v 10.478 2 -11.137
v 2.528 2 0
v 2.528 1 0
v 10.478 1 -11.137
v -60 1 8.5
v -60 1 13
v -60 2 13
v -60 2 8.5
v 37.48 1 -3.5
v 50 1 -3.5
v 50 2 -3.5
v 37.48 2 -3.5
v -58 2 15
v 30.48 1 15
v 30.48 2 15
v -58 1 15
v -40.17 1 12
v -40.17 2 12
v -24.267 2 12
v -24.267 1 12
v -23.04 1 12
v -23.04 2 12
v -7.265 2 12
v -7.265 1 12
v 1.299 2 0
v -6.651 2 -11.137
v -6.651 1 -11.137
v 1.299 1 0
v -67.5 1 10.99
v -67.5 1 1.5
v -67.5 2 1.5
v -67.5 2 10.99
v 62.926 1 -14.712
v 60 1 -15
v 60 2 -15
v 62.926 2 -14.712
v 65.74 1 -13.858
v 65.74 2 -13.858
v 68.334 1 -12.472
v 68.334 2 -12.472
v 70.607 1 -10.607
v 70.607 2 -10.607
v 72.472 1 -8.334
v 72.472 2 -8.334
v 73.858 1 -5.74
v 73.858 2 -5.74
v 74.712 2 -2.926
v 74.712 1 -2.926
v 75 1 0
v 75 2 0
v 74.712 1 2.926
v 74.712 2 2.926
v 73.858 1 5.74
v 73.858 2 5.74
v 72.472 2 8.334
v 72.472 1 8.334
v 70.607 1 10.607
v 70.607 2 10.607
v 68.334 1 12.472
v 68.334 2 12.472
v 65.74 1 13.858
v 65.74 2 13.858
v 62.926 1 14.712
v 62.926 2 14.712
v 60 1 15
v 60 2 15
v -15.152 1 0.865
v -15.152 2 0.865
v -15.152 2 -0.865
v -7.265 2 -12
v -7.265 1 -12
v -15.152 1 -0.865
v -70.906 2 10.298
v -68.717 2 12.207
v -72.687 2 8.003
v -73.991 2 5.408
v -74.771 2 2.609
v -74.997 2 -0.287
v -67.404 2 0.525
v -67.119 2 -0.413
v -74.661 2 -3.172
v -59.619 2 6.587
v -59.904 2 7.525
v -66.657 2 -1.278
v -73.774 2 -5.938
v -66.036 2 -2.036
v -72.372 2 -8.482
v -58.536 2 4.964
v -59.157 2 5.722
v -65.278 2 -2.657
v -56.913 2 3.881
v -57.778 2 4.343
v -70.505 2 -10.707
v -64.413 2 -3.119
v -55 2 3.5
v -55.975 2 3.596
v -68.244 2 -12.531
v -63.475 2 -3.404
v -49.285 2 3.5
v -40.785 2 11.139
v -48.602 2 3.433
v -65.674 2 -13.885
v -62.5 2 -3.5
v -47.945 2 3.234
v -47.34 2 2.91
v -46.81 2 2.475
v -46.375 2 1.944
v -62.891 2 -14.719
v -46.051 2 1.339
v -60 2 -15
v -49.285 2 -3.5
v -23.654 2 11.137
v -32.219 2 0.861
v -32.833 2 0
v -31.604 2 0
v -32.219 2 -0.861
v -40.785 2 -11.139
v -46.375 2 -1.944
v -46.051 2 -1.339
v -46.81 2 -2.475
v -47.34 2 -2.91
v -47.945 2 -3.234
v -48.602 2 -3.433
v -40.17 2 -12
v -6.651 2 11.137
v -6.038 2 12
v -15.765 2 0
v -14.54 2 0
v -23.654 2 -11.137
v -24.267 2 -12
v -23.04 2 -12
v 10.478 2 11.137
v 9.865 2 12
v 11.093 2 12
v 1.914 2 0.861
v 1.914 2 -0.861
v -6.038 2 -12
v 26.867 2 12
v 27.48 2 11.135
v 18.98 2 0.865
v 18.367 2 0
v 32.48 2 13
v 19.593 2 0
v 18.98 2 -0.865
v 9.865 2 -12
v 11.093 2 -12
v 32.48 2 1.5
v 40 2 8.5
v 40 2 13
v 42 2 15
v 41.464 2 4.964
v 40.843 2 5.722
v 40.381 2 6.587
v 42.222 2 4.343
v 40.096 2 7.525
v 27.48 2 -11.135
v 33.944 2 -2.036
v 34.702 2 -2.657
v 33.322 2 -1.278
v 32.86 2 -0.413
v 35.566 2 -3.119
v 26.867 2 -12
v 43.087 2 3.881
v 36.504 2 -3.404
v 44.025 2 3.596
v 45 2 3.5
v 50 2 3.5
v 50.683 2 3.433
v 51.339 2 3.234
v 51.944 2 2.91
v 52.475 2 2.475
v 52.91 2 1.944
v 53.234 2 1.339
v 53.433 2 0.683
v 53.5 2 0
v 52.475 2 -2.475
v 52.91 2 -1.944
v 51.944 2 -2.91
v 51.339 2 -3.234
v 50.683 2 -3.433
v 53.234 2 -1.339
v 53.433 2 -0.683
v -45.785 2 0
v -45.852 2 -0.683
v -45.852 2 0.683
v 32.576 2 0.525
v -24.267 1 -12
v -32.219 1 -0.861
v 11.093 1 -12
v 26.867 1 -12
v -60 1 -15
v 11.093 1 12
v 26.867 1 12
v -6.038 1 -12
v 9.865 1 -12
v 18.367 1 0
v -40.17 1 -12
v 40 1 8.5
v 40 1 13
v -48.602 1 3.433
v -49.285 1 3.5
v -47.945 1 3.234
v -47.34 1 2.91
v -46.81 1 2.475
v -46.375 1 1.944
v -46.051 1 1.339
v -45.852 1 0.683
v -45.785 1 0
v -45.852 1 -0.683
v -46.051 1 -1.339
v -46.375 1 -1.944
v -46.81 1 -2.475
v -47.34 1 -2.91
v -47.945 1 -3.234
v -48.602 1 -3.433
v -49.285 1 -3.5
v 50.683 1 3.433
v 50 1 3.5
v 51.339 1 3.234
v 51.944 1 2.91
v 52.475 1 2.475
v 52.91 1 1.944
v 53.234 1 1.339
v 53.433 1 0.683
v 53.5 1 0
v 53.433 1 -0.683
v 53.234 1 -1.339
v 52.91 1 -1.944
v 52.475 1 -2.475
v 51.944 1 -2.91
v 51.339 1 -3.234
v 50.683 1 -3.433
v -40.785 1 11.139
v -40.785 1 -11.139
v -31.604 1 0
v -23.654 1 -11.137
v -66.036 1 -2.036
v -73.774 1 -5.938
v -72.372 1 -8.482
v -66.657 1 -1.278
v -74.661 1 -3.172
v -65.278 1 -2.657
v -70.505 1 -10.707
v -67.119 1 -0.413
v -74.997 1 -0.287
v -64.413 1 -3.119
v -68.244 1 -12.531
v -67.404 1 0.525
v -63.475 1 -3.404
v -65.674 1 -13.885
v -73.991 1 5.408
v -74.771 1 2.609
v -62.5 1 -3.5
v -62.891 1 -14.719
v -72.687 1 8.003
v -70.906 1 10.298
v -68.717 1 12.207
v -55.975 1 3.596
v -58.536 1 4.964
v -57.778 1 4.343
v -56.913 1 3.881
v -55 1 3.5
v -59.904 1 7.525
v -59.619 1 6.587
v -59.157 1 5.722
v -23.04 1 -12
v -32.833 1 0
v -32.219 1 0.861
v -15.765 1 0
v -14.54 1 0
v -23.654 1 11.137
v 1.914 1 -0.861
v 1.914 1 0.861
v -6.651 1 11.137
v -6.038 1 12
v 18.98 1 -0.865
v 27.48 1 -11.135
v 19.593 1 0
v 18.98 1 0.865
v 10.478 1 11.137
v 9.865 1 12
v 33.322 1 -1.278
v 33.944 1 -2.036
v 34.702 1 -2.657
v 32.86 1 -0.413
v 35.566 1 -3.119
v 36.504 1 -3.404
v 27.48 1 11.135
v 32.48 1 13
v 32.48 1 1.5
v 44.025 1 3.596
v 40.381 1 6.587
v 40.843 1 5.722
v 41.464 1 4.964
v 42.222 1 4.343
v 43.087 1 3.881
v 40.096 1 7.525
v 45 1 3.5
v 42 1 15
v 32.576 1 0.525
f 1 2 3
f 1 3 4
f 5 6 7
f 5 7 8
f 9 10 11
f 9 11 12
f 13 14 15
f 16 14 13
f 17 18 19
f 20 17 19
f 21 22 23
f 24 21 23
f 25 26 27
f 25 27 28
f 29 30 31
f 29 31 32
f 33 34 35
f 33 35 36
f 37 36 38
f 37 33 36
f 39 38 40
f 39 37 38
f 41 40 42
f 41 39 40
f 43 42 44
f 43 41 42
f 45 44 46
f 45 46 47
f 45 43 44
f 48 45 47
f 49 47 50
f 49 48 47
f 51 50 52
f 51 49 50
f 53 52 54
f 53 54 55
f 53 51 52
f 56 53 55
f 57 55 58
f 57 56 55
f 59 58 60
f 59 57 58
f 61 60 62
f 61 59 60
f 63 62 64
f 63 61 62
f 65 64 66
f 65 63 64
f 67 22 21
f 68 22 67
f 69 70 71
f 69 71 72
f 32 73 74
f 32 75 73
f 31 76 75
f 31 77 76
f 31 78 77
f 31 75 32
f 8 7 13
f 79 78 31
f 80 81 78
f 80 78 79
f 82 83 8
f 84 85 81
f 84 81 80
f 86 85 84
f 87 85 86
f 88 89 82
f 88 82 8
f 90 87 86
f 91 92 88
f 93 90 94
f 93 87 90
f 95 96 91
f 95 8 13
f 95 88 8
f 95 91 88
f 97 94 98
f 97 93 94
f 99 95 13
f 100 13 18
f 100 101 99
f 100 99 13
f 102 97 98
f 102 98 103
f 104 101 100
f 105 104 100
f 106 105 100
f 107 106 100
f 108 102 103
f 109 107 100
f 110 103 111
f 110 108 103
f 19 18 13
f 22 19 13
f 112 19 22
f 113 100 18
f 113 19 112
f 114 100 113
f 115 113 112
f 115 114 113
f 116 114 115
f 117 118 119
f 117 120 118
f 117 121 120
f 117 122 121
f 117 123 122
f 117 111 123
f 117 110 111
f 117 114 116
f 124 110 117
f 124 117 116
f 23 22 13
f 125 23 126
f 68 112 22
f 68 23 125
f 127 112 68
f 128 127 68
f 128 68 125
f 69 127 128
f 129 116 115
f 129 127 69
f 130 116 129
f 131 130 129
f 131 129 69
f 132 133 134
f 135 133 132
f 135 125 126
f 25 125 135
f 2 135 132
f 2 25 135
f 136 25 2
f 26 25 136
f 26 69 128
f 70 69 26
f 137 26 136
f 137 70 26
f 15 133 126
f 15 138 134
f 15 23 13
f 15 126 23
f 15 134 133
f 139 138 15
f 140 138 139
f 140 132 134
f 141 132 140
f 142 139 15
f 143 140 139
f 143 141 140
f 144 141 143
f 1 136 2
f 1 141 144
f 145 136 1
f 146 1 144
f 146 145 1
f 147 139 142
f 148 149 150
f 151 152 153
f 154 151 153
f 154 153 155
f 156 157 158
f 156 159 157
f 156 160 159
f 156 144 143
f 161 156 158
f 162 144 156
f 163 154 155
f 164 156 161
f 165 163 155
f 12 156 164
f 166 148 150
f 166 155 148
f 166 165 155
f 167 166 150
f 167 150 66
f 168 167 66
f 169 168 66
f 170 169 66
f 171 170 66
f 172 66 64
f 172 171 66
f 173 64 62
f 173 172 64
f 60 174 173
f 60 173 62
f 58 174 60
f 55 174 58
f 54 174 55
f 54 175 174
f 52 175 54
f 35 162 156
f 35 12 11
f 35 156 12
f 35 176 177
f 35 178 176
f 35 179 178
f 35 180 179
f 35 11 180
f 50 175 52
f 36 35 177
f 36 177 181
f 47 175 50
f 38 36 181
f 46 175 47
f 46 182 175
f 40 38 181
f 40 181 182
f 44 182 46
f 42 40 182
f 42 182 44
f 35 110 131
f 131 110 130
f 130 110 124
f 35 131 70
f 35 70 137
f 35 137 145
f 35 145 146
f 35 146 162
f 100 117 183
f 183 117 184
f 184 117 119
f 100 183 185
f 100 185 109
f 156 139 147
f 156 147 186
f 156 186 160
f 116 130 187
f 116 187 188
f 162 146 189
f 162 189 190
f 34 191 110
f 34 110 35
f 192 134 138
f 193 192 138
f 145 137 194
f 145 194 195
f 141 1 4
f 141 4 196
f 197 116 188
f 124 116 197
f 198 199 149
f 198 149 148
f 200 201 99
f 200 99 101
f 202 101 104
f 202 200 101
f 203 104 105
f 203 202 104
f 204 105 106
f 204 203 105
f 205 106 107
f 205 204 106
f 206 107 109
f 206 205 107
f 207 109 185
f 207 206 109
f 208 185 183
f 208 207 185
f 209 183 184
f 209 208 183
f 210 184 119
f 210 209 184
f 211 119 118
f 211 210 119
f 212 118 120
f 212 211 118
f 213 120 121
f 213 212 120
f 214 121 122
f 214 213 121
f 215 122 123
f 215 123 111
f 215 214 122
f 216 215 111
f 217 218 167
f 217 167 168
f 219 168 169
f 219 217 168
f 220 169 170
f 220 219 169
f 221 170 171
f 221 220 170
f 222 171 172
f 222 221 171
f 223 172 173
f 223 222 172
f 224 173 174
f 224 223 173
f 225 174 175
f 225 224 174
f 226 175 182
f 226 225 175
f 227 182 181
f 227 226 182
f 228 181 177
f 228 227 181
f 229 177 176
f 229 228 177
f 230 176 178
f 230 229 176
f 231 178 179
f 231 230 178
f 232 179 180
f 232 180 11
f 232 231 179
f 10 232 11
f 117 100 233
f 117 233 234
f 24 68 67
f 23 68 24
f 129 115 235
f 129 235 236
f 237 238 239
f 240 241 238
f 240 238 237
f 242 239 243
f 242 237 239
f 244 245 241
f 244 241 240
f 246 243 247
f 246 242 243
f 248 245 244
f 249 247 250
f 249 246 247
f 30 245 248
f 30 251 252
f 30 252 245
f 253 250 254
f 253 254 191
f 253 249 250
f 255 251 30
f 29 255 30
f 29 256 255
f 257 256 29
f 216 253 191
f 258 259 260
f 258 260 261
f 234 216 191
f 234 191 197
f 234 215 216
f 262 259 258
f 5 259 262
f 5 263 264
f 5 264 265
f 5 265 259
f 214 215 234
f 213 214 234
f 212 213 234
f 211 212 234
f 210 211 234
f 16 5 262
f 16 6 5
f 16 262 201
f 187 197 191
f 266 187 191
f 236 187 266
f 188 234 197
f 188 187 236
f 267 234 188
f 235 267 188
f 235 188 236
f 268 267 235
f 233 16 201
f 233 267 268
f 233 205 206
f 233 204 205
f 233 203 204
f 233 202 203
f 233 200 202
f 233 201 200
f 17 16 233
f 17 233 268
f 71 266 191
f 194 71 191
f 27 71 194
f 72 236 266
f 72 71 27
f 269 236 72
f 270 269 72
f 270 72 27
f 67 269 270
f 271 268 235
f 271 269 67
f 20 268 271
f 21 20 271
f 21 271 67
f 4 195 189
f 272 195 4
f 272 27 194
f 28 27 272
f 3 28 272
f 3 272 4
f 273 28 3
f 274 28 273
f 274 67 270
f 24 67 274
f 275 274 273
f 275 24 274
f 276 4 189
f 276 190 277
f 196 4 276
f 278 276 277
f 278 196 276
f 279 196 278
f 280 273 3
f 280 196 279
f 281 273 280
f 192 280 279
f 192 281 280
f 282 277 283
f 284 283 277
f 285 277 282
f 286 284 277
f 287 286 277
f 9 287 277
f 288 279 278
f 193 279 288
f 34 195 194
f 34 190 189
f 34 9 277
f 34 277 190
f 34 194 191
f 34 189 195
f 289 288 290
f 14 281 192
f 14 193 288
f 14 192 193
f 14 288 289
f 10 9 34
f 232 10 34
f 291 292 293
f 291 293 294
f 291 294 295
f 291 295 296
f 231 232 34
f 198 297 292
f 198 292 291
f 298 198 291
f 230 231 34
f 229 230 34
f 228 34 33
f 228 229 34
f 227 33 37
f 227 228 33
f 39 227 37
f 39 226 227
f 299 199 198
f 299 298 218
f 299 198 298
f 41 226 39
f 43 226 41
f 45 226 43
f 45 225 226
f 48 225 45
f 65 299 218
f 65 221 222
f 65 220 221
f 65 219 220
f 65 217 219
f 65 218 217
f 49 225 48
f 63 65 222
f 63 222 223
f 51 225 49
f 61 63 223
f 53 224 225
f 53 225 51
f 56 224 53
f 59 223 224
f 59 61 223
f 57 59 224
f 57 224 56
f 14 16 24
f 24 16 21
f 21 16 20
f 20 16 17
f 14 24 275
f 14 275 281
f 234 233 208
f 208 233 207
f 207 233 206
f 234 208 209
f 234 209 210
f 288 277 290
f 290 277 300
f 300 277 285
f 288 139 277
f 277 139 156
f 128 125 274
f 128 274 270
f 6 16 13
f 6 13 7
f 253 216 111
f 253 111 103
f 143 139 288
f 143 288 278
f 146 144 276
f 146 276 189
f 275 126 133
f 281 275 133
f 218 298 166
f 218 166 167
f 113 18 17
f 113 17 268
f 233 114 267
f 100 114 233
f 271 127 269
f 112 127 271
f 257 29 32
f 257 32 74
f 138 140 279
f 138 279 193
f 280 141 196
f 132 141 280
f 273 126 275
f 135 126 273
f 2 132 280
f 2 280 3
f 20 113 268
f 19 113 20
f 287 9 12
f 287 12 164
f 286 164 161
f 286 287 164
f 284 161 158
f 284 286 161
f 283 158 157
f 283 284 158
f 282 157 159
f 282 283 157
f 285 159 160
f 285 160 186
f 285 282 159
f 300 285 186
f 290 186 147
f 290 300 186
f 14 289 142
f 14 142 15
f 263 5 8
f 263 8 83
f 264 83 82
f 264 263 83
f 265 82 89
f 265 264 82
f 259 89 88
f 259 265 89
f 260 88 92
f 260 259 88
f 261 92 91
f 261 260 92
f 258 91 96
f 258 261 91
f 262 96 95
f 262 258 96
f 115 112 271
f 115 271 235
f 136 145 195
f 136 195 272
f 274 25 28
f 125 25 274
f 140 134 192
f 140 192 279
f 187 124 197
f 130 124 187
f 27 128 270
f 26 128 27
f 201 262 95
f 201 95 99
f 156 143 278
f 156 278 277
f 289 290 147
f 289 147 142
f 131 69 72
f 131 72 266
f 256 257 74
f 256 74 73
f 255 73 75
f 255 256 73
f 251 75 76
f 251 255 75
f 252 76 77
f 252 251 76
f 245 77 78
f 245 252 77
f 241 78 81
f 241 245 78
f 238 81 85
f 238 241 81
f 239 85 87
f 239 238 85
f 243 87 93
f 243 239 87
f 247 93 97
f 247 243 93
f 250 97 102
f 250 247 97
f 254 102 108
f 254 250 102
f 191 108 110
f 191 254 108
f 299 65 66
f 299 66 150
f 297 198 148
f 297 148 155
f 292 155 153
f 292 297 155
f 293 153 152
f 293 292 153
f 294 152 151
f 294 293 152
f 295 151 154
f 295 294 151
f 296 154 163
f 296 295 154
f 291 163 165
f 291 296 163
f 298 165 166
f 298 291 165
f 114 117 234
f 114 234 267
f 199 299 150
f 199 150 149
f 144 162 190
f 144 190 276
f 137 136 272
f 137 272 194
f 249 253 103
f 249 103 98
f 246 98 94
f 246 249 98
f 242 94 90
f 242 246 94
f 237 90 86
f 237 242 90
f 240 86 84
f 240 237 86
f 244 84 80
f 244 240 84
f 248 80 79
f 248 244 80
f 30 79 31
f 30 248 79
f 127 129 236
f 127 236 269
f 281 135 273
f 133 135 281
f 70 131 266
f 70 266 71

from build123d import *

# Parameters (mm, degrees)
BOSS_EXTRUDE1_DEPTH = 2
SKETCH2_W           = 68.264560608
SKETCH2_H           = 24
CUT_EXTRUDE2_DEPTH  = 1.9
RIB1_REACH          = 78.511
SKETCH4_W           = 200.105791224
SKETCH4_H           = 76.194128196
CUT_EXTRUDE3_DEPTH  = 1


with BuildPart() as part:
    # Sketch1 → Boss-Extrude1 (new body)
    with BuildSketch(Plane(origin=(0, 0, 0), x_dir=(1, 0, 0), z_dir=(0, 1, 0))):
        with BuildLine():
            Line((-60, 15), (60, 15))
            ThreePointArc((60, 15), (75, 0), (60, -15))
            Line((60, -15), (42, -15))
            Line((42, -15), (40, -13))
            Line((40, -13), (40, -8.5))
            ThreePointArc((40, -8.5), (41.464466094, -4.964466094), (45, -3.5))
            Line((45, -3.5), (50, -3.5))
            ThreePointArc((50, -3.5), (53.5, 0), (50, 3.5))
            Line((50, 3.5), (37.479805119, 3.5))
            ThreePointArc((37.479805119, 3.5), (33.944271213, 2.035533906), (32.479805119, -1.5))
            Line((32.479805119, -1.5), (32.479805119, -13))
            Line((32.479805119, -13), (30.479805119, -15))
            Line((30.479805119, -15), (-58, -15))
            Line((-58, -15), (-60, -13))
            Line((-60, -13), (-60, -8.5))
            ThreePointArc((-60, -8.5), (-58.535533906, -4.964466094), (-55, -3.5))
            Line((-55, -3.5), (-49.284755489, -3.5))
            ThreePointArc((-49.284755489, -3.5), (-45.784755489, 0), (-49.284755489, 3.5))
            Line((-49.284755489, 3.5), (-62.5, 3.5))
            ThreePointArc((-62.5, 3.5), (-66.035533906, 2.035533906), (-67.5, -1.5))
            Line((-67.5, -1.5), (-67.5, -10.990381057))
            Line((-67.5, -10.990381057), (-68.71685086, -12.207231917))
            ThreePointArc((-68.71685086, -12.207231917), (-74.284755489, 4.576653867), (-60, 15))
        make_face()
    extrude(amount=BOSS_EXTRUDE1_DEPTH)

    # Sketch2 → Cut-Extrude2 (cut)
    with BuildSketch(Plane(origin=(0, 2, 0), x_dir=(1, 0, 0), z_dir=(0, 1, 0))):
        with Locations((-6.652475185, 0)):
            Rectangle(SKETCH2_W, SKETCH2_H)
    extrude(amount=-CUT_EXTRUDE2_DEPTH, mode=Mode.SUBTRACT)

    # Sketch3 walls → Rib1 (add, up to next)
    with BuildSketch(Plane(origin=(0, 2, 0), x_dir=(1, 0, 0), z_dir=(0, 1, 0)), mode=Mode.PRIVATE) as rib1_sk1:
        Polygon((72.690772086, -74.962221531), (10.481384328, 12.862796479), (-6.650895976, -11.137203521), (-23.650895976, 12.862796479), (-86.225903046, -74.796297525), (-85.411999959, -75.377298184), (-23.654054394, 11.137203521), (-6.654054394, -12.862796479), (10.47822591, 11.137203521), (71.874747605, -75.540238871), align=None)
    rib1_tool1 = extrude(rib1_sk1.sketch, amount=-RIB1_REACH, mode=Mode.PRIVATE) - part.part
    # Sketch3 walls → Rib1 (add, up to next)
    with BuildSketch(Plane(origin=(0, 2, 0), x_dir=(1, 0, 0), z_dir=(0, 1, 0)), mode=Mode.PRIVATE) as rib1_sk2:
        Polygon((-86.225903046, 74.796297525), (-23.650895976, -12.862796479), (-6.650895976, 11.137203521), (10.481384328, -12.862796479), (72.690772086, 74.962221531), (71.874747605, 75.540238871), (10.47822591, -11.137203521), (-6.654054394, 12.862796479), (-23.654054394, -11.137203521), (-85.411999959, 75.377298184), align=None)
    rib1_tool2 = extrude(rib1_sk2.sketch, amount=-RIB1_REACH, mode=Mode.PRIVATE) - part.part
    add(rib1_tool1.solids().sort_by_distance((-15.152475185, 2, 0))[0])
    add(rib1_tool2.solids().sort_by_distance((1.913664967, 2, 0))[0])

    # Sketch4 → Cut-Extrude3 (cut)
    with BuildSketch(Plane.XZ):
        with Locations((12.775985132, -7.388521522)):
            Rectangle(SKETCH4_W, SKETCH4_H)
    extrude(amount=-CUT_EXTRUDE3_DEPTH, mode=Mode.SUBTRACT)


solid = part.part
